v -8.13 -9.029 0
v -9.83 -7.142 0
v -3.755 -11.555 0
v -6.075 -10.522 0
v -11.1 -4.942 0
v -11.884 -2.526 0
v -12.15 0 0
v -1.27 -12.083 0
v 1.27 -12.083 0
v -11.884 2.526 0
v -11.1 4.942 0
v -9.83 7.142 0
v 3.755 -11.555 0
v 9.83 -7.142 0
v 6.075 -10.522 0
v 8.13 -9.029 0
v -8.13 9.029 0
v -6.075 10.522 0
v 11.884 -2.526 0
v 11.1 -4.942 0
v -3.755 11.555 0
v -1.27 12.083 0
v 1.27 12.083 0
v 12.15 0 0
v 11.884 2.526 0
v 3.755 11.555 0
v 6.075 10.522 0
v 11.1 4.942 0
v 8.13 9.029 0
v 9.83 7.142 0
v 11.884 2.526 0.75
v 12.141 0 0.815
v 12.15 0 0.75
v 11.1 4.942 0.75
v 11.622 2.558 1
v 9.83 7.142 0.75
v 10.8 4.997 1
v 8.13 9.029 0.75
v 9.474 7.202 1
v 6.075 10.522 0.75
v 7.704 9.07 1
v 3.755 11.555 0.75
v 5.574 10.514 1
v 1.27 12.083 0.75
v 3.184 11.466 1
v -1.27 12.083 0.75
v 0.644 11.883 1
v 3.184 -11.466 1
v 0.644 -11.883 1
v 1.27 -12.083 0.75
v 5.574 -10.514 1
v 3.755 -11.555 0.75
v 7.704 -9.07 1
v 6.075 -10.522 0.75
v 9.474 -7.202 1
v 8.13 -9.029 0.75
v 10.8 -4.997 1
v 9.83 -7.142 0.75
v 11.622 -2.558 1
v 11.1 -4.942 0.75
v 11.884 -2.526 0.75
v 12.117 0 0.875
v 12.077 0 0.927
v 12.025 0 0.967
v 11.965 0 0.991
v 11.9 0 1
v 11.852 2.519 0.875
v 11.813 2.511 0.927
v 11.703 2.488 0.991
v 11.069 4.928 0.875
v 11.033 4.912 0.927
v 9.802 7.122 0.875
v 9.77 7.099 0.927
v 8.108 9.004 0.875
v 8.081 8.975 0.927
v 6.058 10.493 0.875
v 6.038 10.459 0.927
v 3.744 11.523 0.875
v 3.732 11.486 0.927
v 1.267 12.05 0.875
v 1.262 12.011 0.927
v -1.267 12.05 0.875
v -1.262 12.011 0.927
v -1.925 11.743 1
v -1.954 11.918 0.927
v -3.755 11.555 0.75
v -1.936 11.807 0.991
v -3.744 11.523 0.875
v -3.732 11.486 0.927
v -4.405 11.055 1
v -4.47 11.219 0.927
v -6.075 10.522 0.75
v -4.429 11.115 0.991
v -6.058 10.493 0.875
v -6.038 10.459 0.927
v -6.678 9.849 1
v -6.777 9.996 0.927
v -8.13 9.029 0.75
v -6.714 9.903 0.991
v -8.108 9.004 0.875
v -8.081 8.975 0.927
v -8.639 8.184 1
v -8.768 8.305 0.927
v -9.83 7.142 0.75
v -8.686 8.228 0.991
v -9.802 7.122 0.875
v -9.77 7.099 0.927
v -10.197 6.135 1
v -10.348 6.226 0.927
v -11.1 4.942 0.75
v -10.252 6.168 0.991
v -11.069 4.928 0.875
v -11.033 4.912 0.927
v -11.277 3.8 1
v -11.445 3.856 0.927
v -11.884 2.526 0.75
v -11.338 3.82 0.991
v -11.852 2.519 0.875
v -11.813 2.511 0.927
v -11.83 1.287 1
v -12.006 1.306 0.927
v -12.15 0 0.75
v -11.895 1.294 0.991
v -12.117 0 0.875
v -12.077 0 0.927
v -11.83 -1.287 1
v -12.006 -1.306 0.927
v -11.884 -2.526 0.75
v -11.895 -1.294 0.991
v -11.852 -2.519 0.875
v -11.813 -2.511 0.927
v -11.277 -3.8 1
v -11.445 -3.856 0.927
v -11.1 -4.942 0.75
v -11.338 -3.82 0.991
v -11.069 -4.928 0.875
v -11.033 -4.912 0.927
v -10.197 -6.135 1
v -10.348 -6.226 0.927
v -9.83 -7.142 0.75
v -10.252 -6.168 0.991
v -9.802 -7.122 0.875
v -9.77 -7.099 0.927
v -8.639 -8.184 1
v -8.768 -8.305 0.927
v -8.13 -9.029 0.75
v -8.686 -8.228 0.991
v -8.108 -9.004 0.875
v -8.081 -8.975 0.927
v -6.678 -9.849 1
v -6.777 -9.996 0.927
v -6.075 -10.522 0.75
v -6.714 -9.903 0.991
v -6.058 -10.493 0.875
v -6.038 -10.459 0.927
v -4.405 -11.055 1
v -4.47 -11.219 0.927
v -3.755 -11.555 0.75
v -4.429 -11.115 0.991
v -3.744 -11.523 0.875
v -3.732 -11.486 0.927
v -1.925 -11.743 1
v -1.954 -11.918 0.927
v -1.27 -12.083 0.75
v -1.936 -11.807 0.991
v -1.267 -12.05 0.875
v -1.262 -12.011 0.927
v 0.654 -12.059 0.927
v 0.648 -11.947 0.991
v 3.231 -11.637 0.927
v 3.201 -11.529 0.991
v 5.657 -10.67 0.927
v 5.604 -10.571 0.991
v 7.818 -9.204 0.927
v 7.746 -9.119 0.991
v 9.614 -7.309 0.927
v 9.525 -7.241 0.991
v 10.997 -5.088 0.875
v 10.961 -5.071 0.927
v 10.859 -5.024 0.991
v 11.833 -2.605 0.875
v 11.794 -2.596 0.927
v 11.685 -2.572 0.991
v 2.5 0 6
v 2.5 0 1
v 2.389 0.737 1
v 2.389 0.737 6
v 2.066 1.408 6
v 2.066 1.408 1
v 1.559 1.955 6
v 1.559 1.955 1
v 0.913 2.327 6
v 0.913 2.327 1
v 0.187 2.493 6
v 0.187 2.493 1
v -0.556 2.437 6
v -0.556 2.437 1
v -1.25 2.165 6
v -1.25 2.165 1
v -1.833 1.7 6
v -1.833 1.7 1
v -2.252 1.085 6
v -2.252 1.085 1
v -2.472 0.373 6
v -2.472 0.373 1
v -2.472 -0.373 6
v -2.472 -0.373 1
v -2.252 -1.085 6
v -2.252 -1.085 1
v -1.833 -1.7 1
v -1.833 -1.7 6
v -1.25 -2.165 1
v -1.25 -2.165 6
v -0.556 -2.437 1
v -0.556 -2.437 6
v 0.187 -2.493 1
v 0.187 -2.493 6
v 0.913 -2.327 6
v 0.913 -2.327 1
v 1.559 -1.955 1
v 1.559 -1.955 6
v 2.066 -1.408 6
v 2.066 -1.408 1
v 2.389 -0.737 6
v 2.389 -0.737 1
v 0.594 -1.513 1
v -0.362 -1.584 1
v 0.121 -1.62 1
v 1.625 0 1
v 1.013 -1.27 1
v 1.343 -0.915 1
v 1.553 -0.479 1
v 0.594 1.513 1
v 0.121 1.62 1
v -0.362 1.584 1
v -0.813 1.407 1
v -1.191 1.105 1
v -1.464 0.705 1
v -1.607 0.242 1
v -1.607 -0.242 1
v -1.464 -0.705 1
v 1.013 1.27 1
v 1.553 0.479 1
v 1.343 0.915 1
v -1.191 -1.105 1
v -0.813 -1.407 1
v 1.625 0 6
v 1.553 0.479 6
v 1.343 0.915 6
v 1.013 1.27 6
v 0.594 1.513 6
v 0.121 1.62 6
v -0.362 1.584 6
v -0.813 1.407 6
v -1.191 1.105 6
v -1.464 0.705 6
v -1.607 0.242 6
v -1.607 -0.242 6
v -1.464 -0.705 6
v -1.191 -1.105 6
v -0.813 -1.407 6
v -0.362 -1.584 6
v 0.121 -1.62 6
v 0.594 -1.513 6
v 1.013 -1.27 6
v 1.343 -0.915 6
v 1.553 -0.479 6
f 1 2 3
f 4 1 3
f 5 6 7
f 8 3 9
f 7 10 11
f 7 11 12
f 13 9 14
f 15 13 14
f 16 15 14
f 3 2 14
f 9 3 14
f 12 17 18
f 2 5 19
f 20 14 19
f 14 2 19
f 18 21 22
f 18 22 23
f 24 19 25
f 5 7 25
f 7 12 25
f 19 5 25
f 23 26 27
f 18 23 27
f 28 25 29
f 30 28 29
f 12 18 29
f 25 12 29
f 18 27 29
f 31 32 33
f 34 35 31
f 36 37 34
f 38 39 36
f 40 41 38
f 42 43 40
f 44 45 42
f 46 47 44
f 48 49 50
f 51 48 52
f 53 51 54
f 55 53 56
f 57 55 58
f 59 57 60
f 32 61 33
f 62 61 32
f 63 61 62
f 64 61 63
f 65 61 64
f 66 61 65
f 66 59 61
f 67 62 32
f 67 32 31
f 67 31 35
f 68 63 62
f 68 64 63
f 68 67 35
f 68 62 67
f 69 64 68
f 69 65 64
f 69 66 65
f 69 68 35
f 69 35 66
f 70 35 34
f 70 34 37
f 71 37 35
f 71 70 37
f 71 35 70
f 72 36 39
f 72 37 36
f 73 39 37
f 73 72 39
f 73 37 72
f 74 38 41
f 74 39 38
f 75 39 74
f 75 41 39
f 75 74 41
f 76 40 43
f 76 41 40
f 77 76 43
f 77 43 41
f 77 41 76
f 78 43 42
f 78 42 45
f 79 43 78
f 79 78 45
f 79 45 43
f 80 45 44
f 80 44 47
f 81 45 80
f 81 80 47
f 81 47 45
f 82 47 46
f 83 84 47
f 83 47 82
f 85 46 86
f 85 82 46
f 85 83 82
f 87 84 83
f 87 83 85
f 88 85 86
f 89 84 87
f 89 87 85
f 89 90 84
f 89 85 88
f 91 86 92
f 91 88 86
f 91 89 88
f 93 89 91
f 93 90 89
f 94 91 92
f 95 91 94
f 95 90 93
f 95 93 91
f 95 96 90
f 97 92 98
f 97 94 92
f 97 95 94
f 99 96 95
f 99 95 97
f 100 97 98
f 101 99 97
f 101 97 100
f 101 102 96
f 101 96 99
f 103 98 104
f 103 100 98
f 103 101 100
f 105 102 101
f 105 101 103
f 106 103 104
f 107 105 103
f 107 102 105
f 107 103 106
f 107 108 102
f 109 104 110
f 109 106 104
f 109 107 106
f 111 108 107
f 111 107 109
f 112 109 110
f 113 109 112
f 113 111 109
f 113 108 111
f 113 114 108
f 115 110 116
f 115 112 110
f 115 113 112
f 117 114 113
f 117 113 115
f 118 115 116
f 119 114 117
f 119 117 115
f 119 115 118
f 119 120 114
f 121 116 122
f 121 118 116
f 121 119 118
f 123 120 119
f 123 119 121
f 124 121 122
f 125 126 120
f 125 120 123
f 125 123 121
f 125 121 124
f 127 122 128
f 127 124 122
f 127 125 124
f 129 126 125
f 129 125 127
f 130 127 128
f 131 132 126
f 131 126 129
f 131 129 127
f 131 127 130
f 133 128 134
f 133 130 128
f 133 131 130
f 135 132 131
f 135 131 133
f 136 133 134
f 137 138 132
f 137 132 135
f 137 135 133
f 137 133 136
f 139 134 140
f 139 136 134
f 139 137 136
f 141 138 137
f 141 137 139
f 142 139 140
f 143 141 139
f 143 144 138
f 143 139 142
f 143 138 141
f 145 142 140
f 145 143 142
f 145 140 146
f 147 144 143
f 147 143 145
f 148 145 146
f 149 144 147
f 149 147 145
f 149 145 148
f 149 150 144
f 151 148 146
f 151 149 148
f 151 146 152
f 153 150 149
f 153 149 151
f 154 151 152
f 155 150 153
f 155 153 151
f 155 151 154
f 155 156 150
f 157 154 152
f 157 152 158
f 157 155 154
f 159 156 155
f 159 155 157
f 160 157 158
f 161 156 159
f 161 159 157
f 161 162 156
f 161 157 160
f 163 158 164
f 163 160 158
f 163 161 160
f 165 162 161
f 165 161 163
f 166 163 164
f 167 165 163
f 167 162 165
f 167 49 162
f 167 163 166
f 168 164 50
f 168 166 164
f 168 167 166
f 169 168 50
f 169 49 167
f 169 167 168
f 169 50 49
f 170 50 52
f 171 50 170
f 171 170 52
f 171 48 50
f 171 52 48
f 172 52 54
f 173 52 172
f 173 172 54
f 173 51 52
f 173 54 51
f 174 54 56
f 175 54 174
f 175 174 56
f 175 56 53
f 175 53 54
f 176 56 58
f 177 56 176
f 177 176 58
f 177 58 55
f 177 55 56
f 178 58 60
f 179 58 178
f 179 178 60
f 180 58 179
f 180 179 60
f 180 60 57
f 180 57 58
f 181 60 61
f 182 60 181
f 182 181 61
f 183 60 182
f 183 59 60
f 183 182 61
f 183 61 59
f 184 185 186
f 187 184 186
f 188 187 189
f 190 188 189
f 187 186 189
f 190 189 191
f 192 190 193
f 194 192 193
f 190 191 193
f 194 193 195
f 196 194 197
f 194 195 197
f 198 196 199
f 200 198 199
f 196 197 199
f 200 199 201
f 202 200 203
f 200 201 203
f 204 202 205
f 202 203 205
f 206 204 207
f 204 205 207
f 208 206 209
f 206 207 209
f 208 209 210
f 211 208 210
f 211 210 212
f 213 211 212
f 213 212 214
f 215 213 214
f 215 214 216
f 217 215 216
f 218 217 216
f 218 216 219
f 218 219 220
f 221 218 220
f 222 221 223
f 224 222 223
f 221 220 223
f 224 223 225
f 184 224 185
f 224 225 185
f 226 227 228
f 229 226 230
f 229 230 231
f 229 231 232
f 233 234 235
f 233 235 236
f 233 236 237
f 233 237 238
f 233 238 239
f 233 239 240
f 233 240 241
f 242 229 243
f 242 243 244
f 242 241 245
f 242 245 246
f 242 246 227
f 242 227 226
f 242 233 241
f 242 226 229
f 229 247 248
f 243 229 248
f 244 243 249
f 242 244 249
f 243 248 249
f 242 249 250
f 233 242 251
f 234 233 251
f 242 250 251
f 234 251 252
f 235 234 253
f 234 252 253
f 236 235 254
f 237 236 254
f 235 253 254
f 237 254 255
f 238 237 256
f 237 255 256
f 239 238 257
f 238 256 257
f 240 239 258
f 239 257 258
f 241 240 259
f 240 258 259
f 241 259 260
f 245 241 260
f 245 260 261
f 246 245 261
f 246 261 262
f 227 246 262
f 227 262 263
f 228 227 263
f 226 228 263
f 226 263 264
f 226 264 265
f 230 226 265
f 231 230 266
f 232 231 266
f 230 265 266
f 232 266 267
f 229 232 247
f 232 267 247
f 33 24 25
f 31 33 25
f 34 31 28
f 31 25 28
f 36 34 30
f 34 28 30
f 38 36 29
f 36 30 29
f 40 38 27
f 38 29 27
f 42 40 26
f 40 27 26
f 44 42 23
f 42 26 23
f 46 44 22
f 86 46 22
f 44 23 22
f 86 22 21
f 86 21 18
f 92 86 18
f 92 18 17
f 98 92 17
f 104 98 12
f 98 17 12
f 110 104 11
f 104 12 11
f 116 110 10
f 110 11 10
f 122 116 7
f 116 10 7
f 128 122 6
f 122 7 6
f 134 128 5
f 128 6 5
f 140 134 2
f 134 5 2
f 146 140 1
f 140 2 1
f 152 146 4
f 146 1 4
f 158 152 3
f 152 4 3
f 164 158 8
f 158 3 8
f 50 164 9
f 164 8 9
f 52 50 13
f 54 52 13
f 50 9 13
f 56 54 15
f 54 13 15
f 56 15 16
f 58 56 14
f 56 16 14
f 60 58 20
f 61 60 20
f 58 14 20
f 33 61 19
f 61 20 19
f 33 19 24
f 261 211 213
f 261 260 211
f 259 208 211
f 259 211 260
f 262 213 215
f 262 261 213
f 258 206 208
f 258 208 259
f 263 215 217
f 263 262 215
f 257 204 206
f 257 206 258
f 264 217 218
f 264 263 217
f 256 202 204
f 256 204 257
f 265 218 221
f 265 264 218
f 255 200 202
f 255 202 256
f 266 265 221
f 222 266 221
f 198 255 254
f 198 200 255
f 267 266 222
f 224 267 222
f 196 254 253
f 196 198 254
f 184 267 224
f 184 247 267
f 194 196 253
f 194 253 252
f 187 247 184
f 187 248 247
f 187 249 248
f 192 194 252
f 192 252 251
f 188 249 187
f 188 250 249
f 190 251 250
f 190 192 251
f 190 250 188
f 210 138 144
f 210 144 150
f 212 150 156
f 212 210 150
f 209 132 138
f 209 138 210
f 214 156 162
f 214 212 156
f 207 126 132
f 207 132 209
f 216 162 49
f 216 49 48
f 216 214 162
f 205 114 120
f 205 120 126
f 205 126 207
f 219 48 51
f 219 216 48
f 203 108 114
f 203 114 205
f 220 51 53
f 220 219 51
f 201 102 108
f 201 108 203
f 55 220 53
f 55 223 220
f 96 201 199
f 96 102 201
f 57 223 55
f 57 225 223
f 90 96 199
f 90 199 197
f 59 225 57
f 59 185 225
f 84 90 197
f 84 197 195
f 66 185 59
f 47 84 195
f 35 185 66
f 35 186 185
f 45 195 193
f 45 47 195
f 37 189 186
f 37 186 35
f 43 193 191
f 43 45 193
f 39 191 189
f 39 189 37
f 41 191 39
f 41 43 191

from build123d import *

# Parameters (mm, degrees)
SKETCH_R     = 12.15
PAD_DEPTH    = 1
FILLET_R     = 0.25
SKETCH001_R  = 2.5
PAD001_DEPTH = 5
SKETCH002_R  = 1.625
POCKET_DEPTH = 5


with BuildPart() as part:
    # Sketch → Pad (new body)
    with BuildSketch(Plane.XY):
        Circle(SKETCH_R)
    extrude(amount=PAD_DEPTH)

    # Fillet
    fillet_edges = [part.edges().sort_by_distance(p)[0] for p in [
        (-12.15, 0, 1),
    ]]
    fillet(fillet_edges, radius=FILLET_R)

    # Sketch001 (on Face4 of Fillet) → Pad001 (join)
    with BuildSketch(Plane.XY.offset(1)):
        Circle(SKETCH001_R)
    extrude(amount=PAD001_DEPTH)

    # Sketch002 (on Face6 of Pad001) → Pocket (cut)
    with BuildSketch(Plane.XY.offset(6)):
        Circle(SKETCH002_R)
    extrude(amount=-POCKET_DEPTH, mode=Mode.SUBTRACT)


solid = part.part
